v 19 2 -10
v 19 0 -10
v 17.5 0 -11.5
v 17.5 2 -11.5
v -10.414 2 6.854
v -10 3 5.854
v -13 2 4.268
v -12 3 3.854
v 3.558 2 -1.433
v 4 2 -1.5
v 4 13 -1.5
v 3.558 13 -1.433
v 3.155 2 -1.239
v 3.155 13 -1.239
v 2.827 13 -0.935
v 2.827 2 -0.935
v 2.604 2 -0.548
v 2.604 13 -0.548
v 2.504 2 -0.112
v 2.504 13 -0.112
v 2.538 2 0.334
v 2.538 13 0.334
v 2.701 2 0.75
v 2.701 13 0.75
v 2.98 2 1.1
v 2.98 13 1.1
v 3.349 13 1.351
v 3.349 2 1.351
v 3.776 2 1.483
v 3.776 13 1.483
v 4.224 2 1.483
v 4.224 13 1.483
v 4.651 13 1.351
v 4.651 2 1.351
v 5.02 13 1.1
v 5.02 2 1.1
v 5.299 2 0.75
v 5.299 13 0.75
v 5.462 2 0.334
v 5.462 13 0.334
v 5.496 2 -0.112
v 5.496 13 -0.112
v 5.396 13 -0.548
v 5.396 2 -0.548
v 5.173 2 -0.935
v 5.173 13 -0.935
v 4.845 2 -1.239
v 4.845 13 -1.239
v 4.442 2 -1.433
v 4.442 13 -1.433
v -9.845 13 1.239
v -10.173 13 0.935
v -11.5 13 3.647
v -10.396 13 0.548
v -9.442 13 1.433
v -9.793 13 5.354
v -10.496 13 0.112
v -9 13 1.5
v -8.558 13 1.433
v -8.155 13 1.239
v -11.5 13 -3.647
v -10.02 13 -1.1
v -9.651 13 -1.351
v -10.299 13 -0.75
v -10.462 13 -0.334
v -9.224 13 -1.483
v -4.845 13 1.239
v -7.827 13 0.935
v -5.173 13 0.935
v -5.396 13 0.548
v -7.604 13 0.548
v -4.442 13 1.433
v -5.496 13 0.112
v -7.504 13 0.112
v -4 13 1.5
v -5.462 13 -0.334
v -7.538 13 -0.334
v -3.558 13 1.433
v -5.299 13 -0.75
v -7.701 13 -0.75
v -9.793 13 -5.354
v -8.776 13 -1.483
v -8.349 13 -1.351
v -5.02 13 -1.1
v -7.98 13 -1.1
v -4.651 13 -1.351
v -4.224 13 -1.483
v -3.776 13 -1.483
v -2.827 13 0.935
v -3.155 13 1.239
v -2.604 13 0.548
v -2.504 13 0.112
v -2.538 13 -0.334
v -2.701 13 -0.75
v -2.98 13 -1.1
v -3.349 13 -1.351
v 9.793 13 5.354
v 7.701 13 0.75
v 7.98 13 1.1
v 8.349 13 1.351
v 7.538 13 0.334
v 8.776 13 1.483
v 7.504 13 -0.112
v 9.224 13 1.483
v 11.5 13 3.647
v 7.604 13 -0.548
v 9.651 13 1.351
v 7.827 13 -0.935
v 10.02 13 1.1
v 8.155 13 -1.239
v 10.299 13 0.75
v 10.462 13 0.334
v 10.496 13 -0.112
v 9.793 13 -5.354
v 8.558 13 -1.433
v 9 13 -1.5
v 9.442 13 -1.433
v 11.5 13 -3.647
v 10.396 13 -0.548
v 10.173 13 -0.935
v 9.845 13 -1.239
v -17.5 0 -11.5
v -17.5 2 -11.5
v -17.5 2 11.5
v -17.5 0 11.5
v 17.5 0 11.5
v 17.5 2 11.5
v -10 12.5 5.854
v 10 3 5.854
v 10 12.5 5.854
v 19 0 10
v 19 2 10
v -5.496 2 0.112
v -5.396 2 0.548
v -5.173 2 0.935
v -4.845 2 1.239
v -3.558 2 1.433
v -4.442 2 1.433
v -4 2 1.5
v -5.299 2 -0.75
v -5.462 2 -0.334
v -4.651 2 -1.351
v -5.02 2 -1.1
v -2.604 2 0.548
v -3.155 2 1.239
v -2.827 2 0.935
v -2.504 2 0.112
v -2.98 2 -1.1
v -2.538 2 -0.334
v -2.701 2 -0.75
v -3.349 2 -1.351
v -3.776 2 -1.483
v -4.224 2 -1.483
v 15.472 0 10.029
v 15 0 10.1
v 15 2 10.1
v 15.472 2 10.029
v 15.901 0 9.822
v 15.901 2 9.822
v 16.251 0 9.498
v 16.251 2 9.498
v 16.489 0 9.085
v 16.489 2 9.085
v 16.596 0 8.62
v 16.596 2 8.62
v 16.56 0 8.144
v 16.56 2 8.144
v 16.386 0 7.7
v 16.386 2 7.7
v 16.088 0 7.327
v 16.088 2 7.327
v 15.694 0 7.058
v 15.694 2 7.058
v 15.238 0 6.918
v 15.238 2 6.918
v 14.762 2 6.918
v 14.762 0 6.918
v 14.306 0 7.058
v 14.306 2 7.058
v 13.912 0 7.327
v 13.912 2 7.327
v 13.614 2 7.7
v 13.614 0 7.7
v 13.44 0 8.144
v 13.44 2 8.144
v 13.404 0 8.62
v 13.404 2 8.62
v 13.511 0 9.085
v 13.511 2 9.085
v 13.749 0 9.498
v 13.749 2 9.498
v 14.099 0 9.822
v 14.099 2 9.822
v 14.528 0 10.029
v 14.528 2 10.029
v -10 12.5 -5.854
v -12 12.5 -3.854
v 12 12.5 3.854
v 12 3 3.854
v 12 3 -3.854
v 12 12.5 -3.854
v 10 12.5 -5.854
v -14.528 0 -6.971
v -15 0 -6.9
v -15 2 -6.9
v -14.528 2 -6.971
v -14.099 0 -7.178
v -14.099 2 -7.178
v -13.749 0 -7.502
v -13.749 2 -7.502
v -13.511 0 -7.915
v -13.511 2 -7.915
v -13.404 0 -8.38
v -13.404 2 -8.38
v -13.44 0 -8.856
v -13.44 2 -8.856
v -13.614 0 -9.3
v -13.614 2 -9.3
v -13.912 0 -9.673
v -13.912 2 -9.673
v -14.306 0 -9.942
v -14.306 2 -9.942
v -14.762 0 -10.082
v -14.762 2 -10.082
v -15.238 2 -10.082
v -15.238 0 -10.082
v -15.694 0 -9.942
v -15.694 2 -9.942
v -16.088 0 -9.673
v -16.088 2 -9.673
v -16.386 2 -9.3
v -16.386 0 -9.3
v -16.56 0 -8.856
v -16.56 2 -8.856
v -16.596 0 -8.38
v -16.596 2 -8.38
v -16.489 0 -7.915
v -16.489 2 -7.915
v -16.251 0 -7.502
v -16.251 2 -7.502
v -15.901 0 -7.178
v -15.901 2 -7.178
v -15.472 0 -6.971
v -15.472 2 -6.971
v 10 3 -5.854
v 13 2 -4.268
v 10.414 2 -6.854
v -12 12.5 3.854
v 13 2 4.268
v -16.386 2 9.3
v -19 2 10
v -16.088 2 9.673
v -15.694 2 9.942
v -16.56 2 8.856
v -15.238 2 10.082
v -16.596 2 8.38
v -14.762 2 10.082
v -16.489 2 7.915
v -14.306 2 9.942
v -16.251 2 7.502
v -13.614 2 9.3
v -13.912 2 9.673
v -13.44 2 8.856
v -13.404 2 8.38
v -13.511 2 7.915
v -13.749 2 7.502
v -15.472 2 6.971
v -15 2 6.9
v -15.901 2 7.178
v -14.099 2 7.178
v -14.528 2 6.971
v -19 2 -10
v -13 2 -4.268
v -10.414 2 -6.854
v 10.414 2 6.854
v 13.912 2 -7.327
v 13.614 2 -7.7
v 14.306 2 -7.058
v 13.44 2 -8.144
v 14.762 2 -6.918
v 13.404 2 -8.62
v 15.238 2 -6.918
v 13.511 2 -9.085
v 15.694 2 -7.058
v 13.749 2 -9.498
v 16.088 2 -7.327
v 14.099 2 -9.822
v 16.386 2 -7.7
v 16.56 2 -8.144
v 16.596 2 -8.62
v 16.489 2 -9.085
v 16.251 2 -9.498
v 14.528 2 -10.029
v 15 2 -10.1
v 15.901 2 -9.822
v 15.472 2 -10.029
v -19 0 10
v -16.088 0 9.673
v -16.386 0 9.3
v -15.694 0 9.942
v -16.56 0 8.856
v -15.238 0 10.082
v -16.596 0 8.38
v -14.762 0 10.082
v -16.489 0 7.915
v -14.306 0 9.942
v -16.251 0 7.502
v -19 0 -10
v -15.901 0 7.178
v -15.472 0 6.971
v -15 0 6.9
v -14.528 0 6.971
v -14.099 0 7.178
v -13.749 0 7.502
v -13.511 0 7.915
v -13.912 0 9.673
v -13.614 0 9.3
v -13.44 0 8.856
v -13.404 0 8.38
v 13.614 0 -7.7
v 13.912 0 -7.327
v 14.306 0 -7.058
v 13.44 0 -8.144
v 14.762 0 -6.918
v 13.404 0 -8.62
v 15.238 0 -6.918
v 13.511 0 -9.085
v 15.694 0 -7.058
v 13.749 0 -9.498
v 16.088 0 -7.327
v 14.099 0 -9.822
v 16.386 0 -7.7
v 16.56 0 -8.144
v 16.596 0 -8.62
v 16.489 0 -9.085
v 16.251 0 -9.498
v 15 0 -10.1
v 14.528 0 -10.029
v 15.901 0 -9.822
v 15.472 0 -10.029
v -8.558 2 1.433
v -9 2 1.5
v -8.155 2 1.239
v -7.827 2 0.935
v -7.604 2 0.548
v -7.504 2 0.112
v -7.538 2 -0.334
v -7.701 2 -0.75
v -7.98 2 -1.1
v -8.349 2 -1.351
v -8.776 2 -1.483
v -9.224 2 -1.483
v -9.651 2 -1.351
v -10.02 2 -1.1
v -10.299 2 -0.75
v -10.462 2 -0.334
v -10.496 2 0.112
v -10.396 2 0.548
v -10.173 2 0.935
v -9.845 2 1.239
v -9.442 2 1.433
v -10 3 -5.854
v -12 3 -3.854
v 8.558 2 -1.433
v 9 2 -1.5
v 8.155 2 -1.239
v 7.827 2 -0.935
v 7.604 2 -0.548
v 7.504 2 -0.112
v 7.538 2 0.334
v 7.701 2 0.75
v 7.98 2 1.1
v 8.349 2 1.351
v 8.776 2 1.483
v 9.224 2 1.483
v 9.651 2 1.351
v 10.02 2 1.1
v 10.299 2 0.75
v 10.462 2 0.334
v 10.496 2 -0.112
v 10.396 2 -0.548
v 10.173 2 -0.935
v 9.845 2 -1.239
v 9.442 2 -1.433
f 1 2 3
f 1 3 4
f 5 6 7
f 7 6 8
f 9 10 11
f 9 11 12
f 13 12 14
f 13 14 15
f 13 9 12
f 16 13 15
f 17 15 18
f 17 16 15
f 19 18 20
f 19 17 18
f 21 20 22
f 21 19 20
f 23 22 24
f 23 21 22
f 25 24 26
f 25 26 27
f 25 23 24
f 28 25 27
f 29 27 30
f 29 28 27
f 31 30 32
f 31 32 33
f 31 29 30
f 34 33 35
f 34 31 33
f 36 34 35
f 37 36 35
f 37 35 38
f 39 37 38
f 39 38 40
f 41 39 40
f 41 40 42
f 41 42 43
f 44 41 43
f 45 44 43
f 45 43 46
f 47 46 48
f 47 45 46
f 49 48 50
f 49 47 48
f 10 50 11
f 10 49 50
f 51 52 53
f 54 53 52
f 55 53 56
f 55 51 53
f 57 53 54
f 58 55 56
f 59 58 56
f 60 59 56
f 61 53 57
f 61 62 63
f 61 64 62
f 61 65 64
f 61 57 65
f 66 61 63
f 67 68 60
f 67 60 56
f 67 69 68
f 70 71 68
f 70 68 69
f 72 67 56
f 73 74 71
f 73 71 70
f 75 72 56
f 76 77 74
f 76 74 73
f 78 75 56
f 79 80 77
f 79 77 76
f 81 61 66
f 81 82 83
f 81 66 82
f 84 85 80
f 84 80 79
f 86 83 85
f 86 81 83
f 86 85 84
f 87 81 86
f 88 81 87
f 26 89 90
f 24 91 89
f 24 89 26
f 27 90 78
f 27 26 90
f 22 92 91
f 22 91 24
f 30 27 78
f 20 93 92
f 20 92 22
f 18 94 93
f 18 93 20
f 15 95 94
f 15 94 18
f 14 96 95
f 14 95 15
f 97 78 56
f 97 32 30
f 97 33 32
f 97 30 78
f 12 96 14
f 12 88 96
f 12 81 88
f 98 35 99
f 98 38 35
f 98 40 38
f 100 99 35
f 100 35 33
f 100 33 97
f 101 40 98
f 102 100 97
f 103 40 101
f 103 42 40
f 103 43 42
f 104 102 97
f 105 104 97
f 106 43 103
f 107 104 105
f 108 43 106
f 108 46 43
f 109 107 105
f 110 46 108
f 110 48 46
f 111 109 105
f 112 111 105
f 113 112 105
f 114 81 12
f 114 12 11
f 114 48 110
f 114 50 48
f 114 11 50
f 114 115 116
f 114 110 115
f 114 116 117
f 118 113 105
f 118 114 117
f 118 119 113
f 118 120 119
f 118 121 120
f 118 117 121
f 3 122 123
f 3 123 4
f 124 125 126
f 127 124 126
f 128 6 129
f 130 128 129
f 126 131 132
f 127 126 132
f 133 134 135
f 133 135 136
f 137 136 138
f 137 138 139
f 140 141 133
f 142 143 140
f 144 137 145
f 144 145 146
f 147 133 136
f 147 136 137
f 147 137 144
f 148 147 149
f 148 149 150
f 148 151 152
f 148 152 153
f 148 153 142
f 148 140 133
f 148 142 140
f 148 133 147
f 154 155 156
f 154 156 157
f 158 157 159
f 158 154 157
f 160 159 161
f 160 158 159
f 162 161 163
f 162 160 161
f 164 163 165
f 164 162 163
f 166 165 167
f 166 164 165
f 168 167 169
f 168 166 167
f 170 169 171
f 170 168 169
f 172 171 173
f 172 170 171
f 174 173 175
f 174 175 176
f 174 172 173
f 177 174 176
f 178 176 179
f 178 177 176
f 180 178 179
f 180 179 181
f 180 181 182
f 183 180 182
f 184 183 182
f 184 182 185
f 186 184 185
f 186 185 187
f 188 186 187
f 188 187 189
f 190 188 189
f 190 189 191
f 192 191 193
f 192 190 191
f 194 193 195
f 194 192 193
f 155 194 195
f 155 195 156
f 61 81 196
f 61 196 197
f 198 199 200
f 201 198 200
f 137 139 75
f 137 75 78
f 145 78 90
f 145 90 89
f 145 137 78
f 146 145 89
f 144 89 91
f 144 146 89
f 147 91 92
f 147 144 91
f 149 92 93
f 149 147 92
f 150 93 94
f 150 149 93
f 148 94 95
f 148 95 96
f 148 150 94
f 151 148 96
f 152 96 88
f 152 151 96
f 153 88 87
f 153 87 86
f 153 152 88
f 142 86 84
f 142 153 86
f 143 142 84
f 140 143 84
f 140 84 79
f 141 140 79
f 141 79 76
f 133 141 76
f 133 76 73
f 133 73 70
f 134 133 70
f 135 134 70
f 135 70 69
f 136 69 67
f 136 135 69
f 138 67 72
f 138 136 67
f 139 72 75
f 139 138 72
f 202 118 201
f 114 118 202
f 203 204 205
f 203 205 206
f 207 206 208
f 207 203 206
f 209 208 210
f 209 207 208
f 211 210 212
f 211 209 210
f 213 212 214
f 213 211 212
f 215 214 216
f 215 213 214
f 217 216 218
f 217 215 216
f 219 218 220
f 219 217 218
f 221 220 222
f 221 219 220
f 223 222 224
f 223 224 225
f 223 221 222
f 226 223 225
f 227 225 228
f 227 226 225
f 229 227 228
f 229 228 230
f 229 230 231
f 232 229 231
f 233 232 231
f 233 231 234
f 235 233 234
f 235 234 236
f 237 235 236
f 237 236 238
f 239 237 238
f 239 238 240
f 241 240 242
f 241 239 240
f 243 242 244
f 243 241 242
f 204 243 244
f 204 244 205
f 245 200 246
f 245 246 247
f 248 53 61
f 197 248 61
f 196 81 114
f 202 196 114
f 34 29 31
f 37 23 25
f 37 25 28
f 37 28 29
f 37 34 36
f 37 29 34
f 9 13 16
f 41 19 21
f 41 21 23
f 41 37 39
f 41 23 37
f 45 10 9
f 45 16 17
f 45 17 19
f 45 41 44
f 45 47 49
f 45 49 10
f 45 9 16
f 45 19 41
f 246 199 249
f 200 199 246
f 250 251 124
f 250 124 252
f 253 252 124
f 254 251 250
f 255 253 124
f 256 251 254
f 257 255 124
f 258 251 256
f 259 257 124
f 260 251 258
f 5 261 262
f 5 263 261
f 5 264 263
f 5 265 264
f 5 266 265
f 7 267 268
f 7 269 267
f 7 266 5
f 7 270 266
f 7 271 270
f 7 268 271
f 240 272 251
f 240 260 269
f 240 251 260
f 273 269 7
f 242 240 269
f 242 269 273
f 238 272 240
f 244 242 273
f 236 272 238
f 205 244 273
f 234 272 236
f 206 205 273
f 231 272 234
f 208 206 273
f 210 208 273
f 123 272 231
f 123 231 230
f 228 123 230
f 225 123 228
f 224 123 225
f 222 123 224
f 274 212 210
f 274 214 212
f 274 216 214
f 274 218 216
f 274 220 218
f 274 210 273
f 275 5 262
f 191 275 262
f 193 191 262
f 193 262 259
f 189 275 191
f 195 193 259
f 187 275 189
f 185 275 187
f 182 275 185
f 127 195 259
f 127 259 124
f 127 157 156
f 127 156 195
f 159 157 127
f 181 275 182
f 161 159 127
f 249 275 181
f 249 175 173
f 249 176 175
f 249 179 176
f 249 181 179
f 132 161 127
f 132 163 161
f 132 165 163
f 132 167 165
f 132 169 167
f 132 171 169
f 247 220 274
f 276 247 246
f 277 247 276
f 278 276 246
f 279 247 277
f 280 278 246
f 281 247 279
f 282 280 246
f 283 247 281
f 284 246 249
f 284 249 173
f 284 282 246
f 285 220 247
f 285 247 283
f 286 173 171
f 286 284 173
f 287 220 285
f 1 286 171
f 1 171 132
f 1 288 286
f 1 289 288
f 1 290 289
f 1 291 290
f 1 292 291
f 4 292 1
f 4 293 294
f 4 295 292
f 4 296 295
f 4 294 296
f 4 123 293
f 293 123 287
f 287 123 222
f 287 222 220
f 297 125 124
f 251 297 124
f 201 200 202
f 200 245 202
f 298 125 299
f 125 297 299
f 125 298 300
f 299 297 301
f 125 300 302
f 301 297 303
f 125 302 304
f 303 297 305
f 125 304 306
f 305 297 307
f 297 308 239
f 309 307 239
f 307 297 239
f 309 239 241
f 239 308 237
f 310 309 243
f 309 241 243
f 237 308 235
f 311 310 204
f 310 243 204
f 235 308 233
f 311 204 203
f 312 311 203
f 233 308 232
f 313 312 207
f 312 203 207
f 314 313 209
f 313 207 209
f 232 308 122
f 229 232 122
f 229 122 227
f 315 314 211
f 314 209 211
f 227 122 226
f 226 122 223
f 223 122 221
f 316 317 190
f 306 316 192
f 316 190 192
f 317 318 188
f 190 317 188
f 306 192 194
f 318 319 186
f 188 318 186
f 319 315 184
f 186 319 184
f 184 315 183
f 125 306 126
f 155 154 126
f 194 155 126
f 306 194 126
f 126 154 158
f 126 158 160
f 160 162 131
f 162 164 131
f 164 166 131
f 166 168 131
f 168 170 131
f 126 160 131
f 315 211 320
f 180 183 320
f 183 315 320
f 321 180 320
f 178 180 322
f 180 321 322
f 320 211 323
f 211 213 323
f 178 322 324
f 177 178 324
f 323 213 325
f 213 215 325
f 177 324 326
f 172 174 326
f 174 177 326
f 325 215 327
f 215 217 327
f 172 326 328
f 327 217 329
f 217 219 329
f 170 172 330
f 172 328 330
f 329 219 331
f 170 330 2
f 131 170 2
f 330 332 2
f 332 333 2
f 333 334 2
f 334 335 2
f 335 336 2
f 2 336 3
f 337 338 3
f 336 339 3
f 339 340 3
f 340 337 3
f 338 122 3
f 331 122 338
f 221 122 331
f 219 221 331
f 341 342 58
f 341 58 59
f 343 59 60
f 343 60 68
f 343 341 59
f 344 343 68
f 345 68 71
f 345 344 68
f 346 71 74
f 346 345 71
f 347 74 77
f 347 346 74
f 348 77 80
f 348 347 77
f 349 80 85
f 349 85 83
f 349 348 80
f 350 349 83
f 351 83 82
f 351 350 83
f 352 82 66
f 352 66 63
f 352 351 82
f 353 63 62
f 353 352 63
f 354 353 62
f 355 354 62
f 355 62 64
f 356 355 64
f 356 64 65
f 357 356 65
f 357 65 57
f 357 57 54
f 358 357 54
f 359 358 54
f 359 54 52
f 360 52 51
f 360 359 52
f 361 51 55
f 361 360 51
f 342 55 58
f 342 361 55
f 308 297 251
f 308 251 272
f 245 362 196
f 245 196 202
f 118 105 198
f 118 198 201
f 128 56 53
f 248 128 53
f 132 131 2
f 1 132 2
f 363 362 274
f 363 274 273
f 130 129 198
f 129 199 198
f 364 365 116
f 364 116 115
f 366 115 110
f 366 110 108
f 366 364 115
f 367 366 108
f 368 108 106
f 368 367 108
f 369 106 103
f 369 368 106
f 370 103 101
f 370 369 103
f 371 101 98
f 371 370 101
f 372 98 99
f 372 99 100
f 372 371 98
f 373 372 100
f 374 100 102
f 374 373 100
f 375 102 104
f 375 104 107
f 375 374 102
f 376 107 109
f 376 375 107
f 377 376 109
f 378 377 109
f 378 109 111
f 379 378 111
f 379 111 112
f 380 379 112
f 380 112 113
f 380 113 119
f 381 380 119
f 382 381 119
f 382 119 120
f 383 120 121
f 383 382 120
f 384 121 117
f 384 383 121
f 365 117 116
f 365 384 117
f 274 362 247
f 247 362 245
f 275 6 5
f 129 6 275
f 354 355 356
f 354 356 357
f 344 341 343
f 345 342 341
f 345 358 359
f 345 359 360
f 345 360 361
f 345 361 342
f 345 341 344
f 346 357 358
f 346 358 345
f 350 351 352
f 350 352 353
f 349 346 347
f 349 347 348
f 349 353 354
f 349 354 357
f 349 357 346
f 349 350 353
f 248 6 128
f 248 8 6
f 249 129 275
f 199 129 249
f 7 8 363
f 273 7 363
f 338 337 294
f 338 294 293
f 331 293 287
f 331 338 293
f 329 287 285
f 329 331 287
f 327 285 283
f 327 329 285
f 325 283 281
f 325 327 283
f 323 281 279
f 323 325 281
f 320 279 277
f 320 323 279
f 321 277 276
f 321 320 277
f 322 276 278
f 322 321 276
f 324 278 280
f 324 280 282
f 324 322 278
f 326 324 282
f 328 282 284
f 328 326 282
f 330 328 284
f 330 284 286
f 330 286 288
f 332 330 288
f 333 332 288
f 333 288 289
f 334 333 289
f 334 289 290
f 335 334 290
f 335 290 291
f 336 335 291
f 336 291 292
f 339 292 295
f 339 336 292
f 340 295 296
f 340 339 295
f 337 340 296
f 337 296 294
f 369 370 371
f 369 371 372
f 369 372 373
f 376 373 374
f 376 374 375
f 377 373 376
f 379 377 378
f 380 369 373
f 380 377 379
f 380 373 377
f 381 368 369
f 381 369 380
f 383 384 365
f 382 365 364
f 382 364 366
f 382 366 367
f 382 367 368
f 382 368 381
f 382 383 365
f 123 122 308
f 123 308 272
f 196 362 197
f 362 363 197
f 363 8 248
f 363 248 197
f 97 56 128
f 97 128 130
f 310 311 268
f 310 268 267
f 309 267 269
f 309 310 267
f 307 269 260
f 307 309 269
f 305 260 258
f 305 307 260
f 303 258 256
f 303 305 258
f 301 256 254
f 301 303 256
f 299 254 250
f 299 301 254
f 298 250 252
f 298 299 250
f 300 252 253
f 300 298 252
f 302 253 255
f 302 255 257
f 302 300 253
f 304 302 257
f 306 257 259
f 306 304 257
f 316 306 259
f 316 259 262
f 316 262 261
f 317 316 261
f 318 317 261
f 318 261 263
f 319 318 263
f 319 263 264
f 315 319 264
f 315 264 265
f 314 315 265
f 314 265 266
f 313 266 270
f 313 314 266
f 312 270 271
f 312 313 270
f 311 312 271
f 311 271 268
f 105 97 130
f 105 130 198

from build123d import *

# Parameters (mm, degrees)
SKETCH1_W           = 38
SKETCH1_H           = 23
SKETCH1_R           = 1.6
BOSS_EXTRUDE1_DEPTH = 2
SKETCH2_W           = 24
SKETCH2_H           = 11.708497378
SKETCH2_R           = 1.5
BOSS_EXTRUDE2_DEPTH = 11
CHAMFER1_SIZE       = 2
CHAMFER2_SIZE       = 1
CHAMFER3_SIZE       = 1.5
CHAMFER4_SIZE       = 0.5


with BuildPart() as part:
    # Sketch1 → Boss-Extrude1 (new body)
    with BuildSketch(Plane(origin=(0, 0, 0), x_dir=(1, 0, 0), z_dir=(0, 1, 0))):
        Rectangle(SKETCH1_W, SKETCH1_H)
        with Locations(Location((-15, 8.5, 0), (0, 0, 270))):
            Circle(SKETCH1_R, mode=Mode.SUBTRACT)
        with Locations(Location((15, 8.5, 0), (0, 0, 90))):
            Circle(SKETCH1_R, mode=Mode.SUBTRACT)
        with Locations(Location((15, -8.5, 0), (0, 0, 270))):
            Circle(SKETCH1_R, mode=Mode.SUBTRACT)
        with Locations(Location((-15, -8.5, 0), (0, 0, 90))):
            Circle(SKETCH1_R, mode=Mode.SUBTRACT)
    extrude(amount=BOSS_EXTRUDE1_DEPTH)

    # Sketch2 → Boss-Extrude2 (add)
    with BuildSketch(Plane(origin=(0, 2, 0), x_dir=(1, 0, 0), z_dir=(0, 1, 0))):
        Rectangle(SKETCH2_W, SKETCH2_H)
        with Locations(Location((-9, 0, 0), (0, 0, 270))):
            Circle(SKETCH2_R, mode=Mode.SUBTRACT)
        with Locations(Location((-4, 0, 0), (0, 0, 270))):
            Circle(SKETCH2_R, mode=Mode.SUBTRACT)
        with Locations(Location((4, 0, 0), (0, 0, 90))):
            Circle(SKETCH2_R, mode=Mode.SUBTRACT)
        with Locations(Location((9, 0, 0), (0, 0, 90))):
            Circle(SKETCH2_R, mode=Mode.SUBTRACT)
    extrude(amount=BOSS_EXTRUDE2_DEPTH)

    # Chamfer1
    chamfer1_edges = [part.edges().sort_by_distance(p)[0] for p in [
        (12, 7.5, 5.854248689),
        (12, 7.5, -5.854248689),
        (-12, 7.5, -5.854248689),
        (-12, 7.5, 5.854248689),
    ]]
    chamfer(chamfer1_edges, length=CHAMFER1_SIZE)

    # Chamfer2
    chamfer2_edges = [part.edges().sort_by_distance(p)[0] for p in [
        (0, 2, 5.854248689),
        (-12, 2, 0),
        (0, 2, -5.854248689),
        (12, 2, 0),
        (-11, 2, 4.854248689),
        (-11, 2, -4.854248689),
        (11, 2, -4.854248689),
        (11, 2, 4.854248689),
    ]]
    chamfer(chamfer2_edges, length=CHAMFER2_SIZE)

    # Chamfer3
    chamfer3_edges = [part.edges().sort_by_distance(p)[0] for p in [
        (19, 1, 11.5),
        (-19, 1, 11.5),
        (-19, 1, -11.5),
        (19, 1, -11.5),
    ]]
    chamfer(chamfer3_edges, length=CHAMFER3_SIZE)

    # Chamfer4
    chamfer4_edges = [part.edges().sort_by_distance(p)[0] for p in [
        (0, 13, 5.854248689),
        (-12, 13, 0),
        (12, 13, 0),
        (0, 13, -5.854248689),
        (11, 13, 4.854248689),
        (11, 13, -4.854248689),
        (-11, 13, -4.854248689),
        (-11, 13, 4.854248689),
    ]]
    chamfer(chamfer4_edges, length=CHAMFER4_SIZE)


solid = part.part
